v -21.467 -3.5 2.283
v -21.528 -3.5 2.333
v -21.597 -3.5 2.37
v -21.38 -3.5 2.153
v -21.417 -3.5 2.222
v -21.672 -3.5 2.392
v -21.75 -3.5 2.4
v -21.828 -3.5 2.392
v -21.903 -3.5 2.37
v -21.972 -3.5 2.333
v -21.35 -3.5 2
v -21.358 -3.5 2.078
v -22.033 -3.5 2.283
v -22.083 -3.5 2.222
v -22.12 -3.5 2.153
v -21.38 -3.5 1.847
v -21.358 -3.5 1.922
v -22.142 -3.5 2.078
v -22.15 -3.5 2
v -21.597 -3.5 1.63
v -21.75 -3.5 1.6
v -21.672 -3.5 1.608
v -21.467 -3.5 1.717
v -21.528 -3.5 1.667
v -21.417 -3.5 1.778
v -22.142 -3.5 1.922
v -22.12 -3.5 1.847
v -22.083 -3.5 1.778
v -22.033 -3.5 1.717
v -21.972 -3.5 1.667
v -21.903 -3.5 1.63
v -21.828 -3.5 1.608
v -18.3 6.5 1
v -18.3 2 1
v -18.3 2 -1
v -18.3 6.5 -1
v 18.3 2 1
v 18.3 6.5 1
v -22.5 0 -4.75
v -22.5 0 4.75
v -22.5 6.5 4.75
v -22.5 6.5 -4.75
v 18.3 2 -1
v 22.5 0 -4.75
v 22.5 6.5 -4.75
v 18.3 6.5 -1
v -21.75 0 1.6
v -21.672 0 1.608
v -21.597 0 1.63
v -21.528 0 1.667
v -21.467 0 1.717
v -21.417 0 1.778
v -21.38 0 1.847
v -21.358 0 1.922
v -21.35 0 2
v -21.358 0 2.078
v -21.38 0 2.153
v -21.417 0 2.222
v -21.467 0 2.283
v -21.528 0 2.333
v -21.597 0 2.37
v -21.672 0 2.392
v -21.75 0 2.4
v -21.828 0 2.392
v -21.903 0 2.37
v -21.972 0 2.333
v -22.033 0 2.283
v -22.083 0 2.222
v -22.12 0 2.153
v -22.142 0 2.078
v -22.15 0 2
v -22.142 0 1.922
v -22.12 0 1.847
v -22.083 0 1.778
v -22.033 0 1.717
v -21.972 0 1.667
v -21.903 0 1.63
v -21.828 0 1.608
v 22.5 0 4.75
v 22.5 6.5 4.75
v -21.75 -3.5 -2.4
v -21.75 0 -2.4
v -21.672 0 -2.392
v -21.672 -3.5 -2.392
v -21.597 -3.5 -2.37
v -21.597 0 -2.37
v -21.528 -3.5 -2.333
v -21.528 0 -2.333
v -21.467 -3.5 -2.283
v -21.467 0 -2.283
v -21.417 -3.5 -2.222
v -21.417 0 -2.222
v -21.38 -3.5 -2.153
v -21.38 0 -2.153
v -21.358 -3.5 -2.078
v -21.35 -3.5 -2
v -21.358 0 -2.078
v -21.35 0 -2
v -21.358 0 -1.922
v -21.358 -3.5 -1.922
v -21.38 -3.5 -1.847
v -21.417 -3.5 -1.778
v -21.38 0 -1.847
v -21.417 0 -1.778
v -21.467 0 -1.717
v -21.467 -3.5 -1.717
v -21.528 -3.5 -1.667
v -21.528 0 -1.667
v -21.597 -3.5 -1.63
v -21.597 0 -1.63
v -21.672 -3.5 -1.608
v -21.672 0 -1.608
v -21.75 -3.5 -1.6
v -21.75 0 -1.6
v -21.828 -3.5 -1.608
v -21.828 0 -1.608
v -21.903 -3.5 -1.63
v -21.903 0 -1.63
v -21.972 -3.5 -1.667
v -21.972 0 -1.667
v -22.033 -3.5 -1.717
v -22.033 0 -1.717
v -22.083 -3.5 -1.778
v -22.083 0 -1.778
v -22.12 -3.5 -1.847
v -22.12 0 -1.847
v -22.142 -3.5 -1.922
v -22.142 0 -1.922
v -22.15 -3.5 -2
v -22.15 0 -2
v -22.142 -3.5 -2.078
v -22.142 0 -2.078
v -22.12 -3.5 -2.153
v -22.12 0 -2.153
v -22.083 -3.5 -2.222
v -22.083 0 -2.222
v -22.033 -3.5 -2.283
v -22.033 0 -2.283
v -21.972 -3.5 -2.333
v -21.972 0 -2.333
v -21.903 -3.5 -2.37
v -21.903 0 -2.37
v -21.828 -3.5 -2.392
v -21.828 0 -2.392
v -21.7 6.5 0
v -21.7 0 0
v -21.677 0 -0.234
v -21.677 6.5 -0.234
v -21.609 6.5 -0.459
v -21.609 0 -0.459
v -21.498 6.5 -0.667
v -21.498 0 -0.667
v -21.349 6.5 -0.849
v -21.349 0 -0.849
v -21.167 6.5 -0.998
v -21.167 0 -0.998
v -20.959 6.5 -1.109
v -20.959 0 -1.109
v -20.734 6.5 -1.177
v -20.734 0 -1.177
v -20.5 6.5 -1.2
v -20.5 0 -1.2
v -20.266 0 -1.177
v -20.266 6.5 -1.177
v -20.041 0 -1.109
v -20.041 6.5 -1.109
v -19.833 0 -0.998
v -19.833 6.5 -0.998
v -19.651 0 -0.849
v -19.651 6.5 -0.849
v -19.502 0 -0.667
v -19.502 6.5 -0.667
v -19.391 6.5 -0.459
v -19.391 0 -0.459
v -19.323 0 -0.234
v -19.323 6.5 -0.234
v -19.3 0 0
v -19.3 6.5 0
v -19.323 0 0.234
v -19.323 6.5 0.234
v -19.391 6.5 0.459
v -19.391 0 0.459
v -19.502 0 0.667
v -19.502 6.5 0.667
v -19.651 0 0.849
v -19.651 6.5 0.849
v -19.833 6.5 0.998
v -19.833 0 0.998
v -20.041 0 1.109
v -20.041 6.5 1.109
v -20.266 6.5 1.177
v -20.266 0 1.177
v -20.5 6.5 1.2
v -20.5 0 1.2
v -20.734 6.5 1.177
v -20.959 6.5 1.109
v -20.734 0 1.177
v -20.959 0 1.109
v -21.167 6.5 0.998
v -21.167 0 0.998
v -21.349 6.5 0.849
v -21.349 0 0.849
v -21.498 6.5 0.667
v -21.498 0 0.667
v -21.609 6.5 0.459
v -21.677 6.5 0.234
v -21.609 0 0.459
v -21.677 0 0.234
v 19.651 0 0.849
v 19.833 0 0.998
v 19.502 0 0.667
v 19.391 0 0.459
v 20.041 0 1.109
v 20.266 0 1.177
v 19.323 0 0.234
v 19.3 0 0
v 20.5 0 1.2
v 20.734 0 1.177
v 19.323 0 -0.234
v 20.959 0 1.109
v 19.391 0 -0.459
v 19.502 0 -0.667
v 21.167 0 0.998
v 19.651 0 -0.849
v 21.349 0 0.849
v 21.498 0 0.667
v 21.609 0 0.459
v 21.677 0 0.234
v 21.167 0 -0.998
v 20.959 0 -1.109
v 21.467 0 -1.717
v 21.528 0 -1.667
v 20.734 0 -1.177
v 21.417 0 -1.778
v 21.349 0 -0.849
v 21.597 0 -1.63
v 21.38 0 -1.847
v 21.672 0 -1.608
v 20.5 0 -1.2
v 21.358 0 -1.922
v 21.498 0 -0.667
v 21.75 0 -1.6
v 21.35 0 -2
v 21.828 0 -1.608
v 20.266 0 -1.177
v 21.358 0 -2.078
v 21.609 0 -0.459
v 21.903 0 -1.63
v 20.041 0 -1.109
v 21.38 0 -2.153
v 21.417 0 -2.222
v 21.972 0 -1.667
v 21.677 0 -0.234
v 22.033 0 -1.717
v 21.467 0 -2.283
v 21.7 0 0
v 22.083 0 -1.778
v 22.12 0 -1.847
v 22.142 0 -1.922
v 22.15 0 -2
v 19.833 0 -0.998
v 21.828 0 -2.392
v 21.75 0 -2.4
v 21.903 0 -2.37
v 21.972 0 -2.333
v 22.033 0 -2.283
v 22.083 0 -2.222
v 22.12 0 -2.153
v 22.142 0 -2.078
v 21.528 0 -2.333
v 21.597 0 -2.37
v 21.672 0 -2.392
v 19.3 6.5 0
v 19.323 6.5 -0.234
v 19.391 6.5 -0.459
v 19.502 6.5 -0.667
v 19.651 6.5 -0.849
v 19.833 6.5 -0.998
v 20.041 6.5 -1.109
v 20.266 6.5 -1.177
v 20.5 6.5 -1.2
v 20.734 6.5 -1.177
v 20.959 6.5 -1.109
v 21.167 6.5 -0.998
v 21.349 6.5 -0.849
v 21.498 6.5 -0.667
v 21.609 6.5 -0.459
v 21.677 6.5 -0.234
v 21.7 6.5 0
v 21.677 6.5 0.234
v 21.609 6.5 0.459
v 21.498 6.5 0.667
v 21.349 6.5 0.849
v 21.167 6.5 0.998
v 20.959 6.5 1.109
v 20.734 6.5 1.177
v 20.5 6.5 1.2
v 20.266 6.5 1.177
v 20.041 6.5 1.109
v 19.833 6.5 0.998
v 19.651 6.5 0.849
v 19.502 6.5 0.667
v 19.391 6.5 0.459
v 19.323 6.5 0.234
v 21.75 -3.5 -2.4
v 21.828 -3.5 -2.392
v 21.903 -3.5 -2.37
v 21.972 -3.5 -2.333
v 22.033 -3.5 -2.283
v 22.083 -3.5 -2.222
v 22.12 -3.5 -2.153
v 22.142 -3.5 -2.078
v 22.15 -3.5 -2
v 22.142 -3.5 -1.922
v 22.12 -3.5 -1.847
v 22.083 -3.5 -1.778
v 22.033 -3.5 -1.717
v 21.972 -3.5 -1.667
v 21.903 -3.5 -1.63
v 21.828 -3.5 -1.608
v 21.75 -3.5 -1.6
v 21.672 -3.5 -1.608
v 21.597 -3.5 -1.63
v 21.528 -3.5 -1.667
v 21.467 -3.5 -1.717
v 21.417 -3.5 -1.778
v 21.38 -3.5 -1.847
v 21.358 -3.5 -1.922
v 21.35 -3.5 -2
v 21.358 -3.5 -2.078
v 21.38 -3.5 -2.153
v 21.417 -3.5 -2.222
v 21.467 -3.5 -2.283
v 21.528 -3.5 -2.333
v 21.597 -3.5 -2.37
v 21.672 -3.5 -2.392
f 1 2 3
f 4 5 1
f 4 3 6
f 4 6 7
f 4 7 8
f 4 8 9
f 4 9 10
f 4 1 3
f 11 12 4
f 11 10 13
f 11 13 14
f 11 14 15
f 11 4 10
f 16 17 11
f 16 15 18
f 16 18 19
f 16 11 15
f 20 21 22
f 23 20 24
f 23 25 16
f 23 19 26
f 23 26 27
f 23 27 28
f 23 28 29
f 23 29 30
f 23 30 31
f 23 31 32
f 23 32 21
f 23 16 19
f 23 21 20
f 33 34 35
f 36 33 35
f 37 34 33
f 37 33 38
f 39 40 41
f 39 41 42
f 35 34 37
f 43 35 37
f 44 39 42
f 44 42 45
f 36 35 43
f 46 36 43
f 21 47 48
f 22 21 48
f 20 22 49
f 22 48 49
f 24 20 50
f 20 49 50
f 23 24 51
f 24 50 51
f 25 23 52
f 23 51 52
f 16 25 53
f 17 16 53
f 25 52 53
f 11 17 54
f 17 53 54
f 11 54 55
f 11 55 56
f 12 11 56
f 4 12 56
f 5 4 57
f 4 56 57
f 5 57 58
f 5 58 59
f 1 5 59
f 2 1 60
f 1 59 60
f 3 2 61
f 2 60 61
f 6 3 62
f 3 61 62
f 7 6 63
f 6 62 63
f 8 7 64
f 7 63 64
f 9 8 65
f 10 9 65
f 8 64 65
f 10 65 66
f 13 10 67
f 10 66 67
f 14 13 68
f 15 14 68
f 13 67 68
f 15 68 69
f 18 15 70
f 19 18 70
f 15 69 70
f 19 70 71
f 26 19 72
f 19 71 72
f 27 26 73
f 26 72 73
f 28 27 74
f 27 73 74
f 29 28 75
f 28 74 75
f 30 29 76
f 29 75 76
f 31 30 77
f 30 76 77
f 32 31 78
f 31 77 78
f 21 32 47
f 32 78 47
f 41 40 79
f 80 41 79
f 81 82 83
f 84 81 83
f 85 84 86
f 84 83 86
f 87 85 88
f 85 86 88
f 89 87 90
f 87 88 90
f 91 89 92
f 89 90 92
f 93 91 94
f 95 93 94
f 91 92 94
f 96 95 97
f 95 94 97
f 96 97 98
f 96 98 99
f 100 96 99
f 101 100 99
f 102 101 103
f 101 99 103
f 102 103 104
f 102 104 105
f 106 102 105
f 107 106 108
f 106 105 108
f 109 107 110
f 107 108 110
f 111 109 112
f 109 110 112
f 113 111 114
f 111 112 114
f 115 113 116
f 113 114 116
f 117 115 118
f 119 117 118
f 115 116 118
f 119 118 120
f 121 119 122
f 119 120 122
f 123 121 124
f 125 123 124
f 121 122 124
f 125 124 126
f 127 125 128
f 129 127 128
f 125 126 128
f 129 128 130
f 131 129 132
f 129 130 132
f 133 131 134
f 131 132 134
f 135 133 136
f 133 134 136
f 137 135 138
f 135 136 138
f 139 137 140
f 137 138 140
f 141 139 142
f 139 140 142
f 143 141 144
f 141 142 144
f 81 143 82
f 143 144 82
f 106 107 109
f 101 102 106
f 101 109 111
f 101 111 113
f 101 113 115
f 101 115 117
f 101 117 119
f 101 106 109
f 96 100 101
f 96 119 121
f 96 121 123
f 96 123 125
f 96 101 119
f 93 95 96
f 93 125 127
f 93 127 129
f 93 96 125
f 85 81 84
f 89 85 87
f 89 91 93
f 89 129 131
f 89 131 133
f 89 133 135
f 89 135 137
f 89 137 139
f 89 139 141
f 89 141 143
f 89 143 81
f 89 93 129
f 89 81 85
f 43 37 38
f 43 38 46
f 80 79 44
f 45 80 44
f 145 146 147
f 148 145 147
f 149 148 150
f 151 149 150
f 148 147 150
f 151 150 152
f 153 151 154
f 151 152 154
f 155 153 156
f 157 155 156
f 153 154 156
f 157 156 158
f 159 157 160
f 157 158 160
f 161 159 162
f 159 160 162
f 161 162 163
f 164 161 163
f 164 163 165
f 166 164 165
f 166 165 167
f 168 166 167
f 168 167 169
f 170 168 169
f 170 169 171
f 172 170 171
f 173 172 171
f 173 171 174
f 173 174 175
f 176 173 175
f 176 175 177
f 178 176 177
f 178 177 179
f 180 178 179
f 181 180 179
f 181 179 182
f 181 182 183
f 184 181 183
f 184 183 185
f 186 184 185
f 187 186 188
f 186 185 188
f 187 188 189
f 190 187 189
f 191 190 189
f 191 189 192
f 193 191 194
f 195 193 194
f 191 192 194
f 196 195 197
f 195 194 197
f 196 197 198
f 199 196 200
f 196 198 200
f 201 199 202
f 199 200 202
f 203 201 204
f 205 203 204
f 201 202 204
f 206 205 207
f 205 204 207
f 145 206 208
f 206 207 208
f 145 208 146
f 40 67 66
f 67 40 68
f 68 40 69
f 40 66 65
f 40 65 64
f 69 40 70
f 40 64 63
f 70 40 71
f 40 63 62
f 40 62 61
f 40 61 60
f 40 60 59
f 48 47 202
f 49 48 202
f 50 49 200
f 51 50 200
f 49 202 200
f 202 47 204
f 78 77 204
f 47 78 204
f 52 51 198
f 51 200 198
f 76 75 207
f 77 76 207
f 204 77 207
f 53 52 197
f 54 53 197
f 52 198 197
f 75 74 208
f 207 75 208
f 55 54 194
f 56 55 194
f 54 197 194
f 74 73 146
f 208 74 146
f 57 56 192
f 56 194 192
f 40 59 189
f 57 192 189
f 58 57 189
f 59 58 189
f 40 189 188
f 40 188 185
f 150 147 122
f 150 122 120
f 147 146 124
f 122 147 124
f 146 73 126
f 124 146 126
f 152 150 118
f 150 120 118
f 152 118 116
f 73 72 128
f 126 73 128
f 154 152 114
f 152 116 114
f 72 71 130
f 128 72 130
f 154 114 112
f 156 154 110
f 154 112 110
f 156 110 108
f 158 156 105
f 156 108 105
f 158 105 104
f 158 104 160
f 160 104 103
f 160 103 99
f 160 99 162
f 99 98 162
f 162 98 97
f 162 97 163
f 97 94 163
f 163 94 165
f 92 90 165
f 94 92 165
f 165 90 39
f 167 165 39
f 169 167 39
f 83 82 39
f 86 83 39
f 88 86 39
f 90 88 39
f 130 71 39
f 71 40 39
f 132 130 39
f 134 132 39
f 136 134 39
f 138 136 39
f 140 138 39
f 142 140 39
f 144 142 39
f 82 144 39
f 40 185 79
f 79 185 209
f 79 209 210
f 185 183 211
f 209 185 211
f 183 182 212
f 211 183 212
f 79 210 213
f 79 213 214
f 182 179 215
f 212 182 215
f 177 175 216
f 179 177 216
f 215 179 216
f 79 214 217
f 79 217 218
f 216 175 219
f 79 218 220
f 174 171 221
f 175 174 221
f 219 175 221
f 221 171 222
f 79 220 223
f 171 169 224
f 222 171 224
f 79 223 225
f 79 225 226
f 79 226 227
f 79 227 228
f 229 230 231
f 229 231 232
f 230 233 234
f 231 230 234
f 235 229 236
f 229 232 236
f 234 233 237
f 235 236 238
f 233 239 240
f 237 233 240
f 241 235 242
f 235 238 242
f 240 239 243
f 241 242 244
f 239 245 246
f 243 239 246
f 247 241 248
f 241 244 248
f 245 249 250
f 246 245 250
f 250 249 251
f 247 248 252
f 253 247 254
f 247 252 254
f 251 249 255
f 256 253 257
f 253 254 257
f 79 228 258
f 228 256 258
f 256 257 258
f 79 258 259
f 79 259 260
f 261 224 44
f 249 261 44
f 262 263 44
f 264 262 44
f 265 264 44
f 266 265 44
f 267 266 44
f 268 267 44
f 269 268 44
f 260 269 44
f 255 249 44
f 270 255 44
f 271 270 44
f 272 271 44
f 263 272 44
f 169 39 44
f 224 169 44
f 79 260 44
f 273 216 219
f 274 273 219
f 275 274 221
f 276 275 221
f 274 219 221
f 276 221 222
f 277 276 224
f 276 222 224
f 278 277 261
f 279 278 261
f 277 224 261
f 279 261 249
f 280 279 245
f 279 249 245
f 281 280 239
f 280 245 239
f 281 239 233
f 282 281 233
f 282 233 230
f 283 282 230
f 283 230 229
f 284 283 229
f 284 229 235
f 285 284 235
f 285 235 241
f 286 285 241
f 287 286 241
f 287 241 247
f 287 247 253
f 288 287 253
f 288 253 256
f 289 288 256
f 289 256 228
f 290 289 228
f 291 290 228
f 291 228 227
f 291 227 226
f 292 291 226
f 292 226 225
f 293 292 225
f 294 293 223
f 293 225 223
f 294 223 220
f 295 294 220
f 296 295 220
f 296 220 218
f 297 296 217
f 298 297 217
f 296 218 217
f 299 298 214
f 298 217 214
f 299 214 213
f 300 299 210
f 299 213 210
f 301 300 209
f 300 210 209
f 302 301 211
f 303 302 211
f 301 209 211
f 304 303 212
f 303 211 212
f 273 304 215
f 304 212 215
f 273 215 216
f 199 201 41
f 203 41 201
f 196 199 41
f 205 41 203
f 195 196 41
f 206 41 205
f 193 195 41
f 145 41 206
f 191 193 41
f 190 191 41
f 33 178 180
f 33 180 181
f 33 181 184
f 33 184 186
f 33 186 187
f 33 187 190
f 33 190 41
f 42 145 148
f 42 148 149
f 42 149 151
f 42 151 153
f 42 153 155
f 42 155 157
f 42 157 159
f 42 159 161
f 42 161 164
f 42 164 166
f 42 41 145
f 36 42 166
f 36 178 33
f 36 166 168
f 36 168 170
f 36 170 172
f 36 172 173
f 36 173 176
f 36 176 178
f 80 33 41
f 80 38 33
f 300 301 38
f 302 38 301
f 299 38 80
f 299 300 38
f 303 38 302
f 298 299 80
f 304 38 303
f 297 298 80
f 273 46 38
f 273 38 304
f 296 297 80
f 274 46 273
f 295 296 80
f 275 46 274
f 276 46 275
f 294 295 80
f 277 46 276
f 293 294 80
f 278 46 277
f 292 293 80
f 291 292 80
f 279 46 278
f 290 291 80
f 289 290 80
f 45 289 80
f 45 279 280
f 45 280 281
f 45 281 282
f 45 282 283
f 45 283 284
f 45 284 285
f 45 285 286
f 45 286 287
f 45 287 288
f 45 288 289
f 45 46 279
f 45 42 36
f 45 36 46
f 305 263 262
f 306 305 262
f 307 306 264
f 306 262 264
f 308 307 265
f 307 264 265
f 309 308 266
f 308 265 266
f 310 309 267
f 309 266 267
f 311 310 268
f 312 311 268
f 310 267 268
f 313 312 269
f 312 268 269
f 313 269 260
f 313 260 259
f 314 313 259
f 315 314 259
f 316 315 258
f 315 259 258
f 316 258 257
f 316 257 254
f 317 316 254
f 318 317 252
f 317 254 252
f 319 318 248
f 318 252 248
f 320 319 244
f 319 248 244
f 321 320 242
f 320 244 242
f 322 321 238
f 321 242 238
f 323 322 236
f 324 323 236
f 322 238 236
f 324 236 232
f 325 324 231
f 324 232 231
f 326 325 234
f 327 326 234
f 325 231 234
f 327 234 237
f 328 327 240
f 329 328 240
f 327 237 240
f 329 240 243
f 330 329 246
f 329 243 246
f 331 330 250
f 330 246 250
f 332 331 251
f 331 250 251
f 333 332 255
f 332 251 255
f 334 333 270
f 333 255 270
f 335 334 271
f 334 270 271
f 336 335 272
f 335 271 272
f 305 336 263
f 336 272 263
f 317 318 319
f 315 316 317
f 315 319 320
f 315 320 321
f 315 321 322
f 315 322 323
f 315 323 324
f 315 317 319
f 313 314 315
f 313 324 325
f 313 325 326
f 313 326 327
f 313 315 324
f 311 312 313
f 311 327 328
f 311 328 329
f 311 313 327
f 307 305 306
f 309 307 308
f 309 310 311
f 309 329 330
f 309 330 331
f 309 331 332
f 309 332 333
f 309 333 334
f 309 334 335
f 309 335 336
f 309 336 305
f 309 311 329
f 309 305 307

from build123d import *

# Parameters (mm, degrees)
SKETCH1_W            = 45
SKETCH1_H            = 9.5
SKETCH1_W_2          = 36.6
SKETCH1_H_2          = 2
BOSS_EXTRUDE1_DEPTH  = 6.5
SKETCH2_W            = 45
SKETCH2_H            = 9.5
BOSS_EXTRUDE2_DEPTH  = 2
M2_CLEARANCE_HOLE1_D = 2.4
SKETCH5_R            = 0.4
BOSS_EXTRUDE3_DEPTH  = 3.5


with BuildPart() as part:
    # Sketch1 → Boss-Extrude1 (new body)
    with BuildSketch(Plane(origin=(0, 0, 0), x_dir=(1, 0, 0), z_dir=(0, 1, 0))):
        Rectangle(SKETCH1_W, SKETCH1_H)
        Rectangle(SKETCH1_W_2, SKETCH1_H_2, mode=Mode.SUBTRACT)
    extrude(amount=BOSS_EXTRUDE1_DEPTH)

    # Sketch2 → Boss-Extrude2 (add)
    with BuildSketch(Plane.XZ):
        Rectangle(SKETCH2_W, SKETCH2_H)
    extrude(amount=-BOSS_EXTRUDE2_DEPTH)

    # M2 Clearance Hole1 (through all)
    with Locations(Plane(origin=(0, 6.5, 0), x_dir=(1, 0, 0), z_dir=(0, 1, 0))):
        with Locations((20.5, 0), (-20.5, 0)):
            Hole(M2_CLEARANCE_HOLE1_D / 2)

    # Sketch5 → Boss-Extrude3 (add)
    with BuildSketch(Plane.XZ):
        with Locations(Location((-21.75, 2, 0), (0, 0, 270))):
            Circle(SKETCH5_R)
        with Locations(Location((-21.75, -2, 0), (0, 0, 270))):
            Circle(SKETCH5_R)
        with Locations(Location((21.75, -2, 0), (0, 0, 270))):
            Circle(SKETCH5_R)
    extrude(amount=BOSS_EXTRUDE3_DEPTH)


solid = part.part
